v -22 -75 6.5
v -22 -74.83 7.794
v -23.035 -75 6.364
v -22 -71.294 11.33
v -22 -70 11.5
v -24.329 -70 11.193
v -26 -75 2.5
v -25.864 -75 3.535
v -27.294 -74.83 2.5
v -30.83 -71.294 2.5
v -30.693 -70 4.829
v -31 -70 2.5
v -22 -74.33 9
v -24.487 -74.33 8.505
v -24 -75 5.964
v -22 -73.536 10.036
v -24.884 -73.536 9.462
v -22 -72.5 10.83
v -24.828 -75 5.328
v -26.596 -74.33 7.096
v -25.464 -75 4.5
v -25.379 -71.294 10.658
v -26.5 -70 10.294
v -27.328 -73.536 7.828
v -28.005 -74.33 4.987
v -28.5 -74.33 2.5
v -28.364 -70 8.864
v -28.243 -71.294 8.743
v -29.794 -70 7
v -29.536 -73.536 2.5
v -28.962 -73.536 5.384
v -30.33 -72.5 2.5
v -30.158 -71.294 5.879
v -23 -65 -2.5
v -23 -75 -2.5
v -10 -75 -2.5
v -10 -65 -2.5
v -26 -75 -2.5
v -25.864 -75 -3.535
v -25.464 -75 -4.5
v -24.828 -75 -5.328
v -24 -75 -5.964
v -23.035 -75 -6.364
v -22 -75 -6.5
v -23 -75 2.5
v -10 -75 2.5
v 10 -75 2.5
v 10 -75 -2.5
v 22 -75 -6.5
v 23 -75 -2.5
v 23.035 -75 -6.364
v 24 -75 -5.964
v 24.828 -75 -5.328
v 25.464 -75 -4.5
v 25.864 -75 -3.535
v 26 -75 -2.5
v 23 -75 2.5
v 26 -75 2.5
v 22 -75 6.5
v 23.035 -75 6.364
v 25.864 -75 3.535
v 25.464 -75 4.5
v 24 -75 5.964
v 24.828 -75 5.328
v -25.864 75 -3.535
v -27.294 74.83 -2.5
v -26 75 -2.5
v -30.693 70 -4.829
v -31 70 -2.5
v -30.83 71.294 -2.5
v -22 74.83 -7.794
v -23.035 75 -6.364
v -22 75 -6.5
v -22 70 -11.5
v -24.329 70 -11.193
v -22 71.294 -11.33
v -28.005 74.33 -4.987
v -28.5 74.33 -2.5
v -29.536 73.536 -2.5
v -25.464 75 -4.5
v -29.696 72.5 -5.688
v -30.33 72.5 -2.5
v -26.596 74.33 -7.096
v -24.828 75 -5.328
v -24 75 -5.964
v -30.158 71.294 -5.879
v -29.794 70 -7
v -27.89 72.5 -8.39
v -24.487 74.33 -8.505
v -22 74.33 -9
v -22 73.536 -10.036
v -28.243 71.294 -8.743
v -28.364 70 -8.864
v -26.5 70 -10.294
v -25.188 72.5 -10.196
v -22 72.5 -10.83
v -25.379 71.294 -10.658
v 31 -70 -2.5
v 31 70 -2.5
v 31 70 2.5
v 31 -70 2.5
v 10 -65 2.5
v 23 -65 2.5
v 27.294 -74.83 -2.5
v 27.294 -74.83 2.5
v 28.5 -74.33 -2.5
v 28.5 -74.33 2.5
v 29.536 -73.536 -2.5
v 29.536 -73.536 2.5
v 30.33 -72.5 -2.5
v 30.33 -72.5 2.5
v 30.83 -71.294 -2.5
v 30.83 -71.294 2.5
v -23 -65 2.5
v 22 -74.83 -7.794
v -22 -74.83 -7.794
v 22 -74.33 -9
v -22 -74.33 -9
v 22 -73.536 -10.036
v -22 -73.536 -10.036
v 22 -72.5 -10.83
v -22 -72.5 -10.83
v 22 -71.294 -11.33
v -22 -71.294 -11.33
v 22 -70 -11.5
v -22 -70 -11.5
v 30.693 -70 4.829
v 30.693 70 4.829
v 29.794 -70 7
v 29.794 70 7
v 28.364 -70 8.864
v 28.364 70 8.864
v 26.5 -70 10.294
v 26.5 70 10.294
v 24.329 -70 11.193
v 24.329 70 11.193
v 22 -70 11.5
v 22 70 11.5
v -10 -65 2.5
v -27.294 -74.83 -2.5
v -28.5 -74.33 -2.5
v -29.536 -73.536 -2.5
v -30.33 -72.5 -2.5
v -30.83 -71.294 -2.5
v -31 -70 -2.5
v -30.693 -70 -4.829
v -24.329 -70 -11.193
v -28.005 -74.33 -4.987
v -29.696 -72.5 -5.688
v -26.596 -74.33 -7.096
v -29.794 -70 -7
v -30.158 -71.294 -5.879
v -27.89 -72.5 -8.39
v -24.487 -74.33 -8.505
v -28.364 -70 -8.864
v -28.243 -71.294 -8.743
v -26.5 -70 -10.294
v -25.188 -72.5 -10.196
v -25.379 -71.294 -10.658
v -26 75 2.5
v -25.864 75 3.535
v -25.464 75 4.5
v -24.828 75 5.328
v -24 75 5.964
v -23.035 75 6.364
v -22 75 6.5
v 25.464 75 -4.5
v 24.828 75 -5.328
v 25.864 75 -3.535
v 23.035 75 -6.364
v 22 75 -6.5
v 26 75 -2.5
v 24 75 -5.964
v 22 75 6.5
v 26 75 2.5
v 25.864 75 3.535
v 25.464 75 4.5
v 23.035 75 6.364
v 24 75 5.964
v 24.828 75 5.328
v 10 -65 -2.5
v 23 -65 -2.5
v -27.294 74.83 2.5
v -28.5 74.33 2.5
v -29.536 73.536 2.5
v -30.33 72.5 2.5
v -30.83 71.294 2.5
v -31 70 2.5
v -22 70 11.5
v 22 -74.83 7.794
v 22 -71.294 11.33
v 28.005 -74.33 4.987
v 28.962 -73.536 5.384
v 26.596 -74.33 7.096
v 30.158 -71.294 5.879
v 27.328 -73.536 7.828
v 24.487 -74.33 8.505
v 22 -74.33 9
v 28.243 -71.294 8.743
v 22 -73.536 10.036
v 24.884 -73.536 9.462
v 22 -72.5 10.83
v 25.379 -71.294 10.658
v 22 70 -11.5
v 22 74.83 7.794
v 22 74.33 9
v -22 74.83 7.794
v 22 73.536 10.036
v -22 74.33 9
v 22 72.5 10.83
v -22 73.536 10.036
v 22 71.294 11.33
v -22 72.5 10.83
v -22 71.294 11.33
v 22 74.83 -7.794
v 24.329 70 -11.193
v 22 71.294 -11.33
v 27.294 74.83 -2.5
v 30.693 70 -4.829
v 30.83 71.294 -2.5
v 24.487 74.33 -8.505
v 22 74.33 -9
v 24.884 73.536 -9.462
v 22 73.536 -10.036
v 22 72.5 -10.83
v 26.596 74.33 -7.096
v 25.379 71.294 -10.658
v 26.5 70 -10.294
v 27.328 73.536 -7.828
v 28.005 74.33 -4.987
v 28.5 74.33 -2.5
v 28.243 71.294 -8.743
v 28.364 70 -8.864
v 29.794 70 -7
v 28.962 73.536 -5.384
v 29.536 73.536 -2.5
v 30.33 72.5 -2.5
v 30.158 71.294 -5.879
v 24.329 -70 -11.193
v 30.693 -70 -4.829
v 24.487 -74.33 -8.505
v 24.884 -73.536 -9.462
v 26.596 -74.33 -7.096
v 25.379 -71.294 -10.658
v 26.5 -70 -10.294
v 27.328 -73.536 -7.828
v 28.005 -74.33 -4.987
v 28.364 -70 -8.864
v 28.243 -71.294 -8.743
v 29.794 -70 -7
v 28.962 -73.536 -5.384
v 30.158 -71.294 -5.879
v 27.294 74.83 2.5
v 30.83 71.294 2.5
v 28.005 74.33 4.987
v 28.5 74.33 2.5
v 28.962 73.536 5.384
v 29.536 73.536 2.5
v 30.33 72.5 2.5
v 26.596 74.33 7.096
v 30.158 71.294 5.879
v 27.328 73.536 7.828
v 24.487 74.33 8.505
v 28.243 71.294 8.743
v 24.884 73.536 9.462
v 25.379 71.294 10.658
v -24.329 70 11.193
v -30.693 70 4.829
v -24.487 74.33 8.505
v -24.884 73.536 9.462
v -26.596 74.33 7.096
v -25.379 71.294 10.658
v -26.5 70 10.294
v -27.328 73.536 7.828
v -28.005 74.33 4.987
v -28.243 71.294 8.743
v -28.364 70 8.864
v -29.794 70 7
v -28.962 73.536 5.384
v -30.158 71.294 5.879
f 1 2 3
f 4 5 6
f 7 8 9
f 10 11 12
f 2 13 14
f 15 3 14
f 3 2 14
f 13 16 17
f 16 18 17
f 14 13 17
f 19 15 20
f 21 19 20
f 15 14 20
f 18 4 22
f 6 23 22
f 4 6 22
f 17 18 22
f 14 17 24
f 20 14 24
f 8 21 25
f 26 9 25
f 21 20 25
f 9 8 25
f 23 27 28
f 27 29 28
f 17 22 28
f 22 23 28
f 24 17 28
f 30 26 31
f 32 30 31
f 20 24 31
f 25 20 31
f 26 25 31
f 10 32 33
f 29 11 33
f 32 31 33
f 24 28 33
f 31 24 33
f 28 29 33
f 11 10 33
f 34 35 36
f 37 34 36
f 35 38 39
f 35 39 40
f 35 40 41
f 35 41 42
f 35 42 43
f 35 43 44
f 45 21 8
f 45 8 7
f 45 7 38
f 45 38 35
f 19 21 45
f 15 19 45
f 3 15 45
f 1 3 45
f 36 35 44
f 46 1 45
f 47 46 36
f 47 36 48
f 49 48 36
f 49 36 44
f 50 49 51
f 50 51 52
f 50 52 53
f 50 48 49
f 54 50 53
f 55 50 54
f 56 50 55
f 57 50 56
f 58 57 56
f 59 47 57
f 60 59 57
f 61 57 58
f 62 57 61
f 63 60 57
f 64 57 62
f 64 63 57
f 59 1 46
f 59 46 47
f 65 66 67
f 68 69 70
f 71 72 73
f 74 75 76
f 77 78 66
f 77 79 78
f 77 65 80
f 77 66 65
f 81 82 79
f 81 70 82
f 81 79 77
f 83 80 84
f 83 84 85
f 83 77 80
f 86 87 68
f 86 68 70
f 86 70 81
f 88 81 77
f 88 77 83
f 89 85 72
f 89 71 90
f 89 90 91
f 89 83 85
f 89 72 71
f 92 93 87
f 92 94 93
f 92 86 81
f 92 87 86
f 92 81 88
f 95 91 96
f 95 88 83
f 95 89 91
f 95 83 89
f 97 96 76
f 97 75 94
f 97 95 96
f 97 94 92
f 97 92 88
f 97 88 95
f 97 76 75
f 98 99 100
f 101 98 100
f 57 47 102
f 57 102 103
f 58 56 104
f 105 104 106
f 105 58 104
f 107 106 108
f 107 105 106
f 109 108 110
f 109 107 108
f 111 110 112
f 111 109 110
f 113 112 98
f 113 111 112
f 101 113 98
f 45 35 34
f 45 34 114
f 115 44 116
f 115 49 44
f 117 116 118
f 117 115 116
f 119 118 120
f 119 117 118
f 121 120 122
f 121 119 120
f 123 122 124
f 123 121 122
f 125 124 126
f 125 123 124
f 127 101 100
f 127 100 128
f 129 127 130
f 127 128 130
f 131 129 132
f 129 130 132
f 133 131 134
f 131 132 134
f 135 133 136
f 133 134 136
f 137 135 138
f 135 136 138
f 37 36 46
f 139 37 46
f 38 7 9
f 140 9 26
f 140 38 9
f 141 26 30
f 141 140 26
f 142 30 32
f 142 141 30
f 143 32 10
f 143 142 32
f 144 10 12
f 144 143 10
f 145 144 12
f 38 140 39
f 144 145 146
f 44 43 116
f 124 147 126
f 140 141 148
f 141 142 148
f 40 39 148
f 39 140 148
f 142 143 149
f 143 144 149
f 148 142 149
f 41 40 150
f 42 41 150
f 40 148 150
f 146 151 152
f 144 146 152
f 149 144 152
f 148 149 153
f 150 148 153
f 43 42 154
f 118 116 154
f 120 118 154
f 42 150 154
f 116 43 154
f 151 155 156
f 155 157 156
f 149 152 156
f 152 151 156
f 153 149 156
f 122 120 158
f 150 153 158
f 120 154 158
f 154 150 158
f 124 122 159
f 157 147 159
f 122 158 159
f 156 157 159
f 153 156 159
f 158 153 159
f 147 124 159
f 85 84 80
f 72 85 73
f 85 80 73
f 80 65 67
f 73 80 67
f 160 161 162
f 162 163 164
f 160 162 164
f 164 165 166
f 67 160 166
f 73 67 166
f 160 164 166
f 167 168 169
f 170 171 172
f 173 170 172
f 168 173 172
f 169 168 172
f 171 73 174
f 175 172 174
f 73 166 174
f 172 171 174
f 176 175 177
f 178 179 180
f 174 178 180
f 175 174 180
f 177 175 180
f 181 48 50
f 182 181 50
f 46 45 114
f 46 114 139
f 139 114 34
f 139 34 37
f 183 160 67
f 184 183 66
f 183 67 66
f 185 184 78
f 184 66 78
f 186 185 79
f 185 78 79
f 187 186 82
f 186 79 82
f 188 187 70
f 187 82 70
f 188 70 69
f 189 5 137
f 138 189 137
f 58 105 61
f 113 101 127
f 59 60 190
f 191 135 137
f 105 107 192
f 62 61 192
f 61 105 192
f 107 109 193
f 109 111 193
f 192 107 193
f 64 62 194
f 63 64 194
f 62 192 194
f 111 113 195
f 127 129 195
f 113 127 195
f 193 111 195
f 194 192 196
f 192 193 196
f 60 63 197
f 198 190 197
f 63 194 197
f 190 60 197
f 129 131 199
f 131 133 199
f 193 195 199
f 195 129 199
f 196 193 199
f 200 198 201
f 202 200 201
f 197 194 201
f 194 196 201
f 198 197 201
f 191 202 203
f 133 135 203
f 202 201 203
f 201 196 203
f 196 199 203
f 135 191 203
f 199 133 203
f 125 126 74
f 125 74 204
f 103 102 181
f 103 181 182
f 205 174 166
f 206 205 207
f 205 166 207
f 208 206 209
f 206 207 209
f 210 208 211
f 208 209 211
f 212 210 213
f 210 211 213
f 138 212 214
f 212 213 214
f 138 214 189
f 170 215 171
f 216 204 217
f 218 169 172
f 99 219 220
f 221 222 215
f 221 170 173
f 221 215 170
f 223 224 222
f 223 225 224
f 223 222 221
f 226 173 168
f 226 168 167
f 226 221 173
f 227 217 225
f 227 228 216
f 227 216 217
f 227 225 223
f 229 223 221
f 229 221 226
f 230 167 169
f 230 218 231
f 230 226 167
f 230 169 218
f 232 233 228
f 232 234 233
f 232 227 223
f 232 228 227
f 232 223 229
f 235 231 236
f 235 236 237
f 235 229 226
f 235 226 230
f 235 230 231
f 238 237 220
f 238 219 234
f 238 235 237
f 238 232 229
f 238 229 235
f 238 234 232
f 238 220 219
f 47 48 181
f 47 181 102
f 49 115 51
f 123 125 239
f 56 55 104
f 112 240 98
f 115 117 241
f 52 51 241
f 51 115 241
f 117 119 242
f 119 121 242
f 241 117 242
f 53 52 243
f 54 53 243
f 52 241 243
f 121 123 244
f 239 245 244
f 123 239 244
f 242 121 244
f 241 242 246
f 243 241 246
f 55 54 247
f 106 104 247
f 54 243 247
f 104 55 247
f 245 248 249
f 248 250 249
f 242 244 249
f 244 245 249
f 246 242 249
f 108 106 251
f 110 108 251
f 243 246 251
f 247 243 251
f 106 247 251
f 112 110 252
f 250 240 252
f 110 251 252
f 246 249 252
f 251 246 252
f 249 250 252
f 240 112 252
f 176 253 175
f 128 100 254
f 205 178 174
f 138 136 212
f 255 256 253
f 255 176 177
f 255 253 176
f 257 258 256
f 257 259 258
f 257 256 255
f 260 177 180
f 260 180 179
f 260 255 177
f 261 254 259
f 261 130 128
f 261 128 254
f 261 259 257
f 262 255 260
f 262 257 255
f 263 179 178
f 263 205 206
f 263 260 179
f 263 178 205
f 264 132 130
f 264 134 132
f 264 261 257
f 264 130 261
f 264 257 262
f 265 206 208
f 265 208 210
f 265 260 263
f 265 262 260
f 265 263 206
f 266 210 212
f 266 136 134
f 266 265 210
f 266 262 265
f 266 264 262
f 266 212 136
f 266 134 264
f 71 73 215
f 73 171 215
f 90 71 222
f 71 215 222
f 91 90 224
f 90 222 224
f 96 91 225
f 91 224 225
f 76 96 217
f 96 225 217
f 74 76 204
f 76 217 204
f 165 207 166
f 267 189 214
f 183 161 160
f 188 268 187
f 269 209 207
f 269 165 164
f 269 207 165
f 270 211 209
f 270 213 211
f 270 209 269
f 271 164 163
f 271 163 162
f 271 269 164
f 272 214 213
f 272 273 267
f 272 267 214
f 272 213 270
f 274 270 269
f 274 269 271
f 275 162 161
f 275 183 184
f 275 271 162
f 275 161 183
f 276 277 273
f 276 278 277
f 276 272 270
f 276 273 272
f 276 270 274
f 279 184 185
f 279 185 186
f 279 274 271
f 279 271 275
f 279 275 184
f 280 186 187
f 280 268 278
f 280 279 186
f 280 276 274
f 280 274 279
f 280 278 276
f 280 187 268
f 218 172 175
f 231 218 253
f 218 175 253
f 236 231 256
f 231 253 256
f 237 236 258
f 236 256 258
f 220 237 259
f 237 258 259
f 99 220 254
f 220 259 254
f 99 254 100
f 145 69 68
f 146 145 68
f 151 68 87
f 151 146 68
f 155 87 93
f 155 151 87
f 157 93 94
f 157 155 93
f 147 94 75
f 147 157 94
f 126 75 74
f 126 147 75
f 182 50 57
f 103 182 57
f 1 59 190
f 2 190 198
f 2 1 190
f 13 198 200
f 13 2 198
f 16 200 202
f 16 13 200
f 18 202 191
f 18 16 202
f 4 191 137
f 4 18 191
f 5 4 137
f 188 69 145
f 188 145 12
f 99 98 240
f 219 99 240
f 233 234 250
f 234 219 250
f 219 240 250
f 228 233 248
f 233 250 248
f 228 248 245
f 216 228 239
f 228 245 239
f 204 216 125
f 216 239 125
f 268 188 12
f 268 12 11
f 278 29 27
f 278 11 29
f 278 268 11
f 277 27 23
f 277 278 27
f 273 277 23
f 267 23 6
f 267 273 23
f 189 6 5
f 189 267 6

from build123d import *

# Parameters (mm, degrees)
F0_W          = 62
F0_H          = 23
F1_DEPTH      = 75
F1_DEPTH_BACK = 75
F2_R          = 9
F3_R          = 5
F4_W          = 13
F4_H          = 5
F5_DEPTH      = 10


with BuildPart() as f1:
    # F0 (on Front) → F1 (new body, two sides)
    with BuildSketch(Plane.XZ) as f1_sk:
        Rectangle(F0_W, F0_H)
    extrude(amount=F1_DEPTH)
    extrude(f1_sk.sketch, amount=-F1_DEPTH_BACK)

    # F2
    f2_edges = [f1.edges().sort_by_distance(p)[0] for p in [
        (31, 0, 11.5),
        (31, 0, -11.5),
        (-31, 0, 11.5),
        (-31, 0, -11.5),
    ]]
    fillet(f2_edges, radius=F2_R)

    # F3
    f3_edges = [f1.edges().sort_by_distance(p)[0] for p in [
        (0, -75, -11.5),
        (-28.363961, -75, -8.863961),
        (28.363961, -75, -8.863961),
        (-31, -75, 0),
        (31, -75, 0),
        (-28.363961, -75, 8.863961),
        (28.363961, -75, 8.863961),
        (0, -75, 11.5),
        (0, 75, -11.5),
        (-28.363961, 75, -8.863961),
        (28.363961, 75, -8.863961),
        (-31, 75, 0),
        (31, 75, 0),
        (-28.363961, 75, 8.863961),
        (28.363961, 75, 8.863961),
        (0, 75, 11.5),
    ]]
    fillet(f3_edges, radius=F3_R)

    # F4 (on face) → F5 (cut)
    with BuildSketch(Plane.XZ.offset(75)):
        with Locations((-16.5, 0)):
            Rectangle(F4_W, F4_H)
        with Locations((16.5, 0)):
            Rectangle(F4_W, F4_H)
    extrude(amount=-F5_DEPTH, mode=Mode.SUBTRACT)


solid = f1.part
